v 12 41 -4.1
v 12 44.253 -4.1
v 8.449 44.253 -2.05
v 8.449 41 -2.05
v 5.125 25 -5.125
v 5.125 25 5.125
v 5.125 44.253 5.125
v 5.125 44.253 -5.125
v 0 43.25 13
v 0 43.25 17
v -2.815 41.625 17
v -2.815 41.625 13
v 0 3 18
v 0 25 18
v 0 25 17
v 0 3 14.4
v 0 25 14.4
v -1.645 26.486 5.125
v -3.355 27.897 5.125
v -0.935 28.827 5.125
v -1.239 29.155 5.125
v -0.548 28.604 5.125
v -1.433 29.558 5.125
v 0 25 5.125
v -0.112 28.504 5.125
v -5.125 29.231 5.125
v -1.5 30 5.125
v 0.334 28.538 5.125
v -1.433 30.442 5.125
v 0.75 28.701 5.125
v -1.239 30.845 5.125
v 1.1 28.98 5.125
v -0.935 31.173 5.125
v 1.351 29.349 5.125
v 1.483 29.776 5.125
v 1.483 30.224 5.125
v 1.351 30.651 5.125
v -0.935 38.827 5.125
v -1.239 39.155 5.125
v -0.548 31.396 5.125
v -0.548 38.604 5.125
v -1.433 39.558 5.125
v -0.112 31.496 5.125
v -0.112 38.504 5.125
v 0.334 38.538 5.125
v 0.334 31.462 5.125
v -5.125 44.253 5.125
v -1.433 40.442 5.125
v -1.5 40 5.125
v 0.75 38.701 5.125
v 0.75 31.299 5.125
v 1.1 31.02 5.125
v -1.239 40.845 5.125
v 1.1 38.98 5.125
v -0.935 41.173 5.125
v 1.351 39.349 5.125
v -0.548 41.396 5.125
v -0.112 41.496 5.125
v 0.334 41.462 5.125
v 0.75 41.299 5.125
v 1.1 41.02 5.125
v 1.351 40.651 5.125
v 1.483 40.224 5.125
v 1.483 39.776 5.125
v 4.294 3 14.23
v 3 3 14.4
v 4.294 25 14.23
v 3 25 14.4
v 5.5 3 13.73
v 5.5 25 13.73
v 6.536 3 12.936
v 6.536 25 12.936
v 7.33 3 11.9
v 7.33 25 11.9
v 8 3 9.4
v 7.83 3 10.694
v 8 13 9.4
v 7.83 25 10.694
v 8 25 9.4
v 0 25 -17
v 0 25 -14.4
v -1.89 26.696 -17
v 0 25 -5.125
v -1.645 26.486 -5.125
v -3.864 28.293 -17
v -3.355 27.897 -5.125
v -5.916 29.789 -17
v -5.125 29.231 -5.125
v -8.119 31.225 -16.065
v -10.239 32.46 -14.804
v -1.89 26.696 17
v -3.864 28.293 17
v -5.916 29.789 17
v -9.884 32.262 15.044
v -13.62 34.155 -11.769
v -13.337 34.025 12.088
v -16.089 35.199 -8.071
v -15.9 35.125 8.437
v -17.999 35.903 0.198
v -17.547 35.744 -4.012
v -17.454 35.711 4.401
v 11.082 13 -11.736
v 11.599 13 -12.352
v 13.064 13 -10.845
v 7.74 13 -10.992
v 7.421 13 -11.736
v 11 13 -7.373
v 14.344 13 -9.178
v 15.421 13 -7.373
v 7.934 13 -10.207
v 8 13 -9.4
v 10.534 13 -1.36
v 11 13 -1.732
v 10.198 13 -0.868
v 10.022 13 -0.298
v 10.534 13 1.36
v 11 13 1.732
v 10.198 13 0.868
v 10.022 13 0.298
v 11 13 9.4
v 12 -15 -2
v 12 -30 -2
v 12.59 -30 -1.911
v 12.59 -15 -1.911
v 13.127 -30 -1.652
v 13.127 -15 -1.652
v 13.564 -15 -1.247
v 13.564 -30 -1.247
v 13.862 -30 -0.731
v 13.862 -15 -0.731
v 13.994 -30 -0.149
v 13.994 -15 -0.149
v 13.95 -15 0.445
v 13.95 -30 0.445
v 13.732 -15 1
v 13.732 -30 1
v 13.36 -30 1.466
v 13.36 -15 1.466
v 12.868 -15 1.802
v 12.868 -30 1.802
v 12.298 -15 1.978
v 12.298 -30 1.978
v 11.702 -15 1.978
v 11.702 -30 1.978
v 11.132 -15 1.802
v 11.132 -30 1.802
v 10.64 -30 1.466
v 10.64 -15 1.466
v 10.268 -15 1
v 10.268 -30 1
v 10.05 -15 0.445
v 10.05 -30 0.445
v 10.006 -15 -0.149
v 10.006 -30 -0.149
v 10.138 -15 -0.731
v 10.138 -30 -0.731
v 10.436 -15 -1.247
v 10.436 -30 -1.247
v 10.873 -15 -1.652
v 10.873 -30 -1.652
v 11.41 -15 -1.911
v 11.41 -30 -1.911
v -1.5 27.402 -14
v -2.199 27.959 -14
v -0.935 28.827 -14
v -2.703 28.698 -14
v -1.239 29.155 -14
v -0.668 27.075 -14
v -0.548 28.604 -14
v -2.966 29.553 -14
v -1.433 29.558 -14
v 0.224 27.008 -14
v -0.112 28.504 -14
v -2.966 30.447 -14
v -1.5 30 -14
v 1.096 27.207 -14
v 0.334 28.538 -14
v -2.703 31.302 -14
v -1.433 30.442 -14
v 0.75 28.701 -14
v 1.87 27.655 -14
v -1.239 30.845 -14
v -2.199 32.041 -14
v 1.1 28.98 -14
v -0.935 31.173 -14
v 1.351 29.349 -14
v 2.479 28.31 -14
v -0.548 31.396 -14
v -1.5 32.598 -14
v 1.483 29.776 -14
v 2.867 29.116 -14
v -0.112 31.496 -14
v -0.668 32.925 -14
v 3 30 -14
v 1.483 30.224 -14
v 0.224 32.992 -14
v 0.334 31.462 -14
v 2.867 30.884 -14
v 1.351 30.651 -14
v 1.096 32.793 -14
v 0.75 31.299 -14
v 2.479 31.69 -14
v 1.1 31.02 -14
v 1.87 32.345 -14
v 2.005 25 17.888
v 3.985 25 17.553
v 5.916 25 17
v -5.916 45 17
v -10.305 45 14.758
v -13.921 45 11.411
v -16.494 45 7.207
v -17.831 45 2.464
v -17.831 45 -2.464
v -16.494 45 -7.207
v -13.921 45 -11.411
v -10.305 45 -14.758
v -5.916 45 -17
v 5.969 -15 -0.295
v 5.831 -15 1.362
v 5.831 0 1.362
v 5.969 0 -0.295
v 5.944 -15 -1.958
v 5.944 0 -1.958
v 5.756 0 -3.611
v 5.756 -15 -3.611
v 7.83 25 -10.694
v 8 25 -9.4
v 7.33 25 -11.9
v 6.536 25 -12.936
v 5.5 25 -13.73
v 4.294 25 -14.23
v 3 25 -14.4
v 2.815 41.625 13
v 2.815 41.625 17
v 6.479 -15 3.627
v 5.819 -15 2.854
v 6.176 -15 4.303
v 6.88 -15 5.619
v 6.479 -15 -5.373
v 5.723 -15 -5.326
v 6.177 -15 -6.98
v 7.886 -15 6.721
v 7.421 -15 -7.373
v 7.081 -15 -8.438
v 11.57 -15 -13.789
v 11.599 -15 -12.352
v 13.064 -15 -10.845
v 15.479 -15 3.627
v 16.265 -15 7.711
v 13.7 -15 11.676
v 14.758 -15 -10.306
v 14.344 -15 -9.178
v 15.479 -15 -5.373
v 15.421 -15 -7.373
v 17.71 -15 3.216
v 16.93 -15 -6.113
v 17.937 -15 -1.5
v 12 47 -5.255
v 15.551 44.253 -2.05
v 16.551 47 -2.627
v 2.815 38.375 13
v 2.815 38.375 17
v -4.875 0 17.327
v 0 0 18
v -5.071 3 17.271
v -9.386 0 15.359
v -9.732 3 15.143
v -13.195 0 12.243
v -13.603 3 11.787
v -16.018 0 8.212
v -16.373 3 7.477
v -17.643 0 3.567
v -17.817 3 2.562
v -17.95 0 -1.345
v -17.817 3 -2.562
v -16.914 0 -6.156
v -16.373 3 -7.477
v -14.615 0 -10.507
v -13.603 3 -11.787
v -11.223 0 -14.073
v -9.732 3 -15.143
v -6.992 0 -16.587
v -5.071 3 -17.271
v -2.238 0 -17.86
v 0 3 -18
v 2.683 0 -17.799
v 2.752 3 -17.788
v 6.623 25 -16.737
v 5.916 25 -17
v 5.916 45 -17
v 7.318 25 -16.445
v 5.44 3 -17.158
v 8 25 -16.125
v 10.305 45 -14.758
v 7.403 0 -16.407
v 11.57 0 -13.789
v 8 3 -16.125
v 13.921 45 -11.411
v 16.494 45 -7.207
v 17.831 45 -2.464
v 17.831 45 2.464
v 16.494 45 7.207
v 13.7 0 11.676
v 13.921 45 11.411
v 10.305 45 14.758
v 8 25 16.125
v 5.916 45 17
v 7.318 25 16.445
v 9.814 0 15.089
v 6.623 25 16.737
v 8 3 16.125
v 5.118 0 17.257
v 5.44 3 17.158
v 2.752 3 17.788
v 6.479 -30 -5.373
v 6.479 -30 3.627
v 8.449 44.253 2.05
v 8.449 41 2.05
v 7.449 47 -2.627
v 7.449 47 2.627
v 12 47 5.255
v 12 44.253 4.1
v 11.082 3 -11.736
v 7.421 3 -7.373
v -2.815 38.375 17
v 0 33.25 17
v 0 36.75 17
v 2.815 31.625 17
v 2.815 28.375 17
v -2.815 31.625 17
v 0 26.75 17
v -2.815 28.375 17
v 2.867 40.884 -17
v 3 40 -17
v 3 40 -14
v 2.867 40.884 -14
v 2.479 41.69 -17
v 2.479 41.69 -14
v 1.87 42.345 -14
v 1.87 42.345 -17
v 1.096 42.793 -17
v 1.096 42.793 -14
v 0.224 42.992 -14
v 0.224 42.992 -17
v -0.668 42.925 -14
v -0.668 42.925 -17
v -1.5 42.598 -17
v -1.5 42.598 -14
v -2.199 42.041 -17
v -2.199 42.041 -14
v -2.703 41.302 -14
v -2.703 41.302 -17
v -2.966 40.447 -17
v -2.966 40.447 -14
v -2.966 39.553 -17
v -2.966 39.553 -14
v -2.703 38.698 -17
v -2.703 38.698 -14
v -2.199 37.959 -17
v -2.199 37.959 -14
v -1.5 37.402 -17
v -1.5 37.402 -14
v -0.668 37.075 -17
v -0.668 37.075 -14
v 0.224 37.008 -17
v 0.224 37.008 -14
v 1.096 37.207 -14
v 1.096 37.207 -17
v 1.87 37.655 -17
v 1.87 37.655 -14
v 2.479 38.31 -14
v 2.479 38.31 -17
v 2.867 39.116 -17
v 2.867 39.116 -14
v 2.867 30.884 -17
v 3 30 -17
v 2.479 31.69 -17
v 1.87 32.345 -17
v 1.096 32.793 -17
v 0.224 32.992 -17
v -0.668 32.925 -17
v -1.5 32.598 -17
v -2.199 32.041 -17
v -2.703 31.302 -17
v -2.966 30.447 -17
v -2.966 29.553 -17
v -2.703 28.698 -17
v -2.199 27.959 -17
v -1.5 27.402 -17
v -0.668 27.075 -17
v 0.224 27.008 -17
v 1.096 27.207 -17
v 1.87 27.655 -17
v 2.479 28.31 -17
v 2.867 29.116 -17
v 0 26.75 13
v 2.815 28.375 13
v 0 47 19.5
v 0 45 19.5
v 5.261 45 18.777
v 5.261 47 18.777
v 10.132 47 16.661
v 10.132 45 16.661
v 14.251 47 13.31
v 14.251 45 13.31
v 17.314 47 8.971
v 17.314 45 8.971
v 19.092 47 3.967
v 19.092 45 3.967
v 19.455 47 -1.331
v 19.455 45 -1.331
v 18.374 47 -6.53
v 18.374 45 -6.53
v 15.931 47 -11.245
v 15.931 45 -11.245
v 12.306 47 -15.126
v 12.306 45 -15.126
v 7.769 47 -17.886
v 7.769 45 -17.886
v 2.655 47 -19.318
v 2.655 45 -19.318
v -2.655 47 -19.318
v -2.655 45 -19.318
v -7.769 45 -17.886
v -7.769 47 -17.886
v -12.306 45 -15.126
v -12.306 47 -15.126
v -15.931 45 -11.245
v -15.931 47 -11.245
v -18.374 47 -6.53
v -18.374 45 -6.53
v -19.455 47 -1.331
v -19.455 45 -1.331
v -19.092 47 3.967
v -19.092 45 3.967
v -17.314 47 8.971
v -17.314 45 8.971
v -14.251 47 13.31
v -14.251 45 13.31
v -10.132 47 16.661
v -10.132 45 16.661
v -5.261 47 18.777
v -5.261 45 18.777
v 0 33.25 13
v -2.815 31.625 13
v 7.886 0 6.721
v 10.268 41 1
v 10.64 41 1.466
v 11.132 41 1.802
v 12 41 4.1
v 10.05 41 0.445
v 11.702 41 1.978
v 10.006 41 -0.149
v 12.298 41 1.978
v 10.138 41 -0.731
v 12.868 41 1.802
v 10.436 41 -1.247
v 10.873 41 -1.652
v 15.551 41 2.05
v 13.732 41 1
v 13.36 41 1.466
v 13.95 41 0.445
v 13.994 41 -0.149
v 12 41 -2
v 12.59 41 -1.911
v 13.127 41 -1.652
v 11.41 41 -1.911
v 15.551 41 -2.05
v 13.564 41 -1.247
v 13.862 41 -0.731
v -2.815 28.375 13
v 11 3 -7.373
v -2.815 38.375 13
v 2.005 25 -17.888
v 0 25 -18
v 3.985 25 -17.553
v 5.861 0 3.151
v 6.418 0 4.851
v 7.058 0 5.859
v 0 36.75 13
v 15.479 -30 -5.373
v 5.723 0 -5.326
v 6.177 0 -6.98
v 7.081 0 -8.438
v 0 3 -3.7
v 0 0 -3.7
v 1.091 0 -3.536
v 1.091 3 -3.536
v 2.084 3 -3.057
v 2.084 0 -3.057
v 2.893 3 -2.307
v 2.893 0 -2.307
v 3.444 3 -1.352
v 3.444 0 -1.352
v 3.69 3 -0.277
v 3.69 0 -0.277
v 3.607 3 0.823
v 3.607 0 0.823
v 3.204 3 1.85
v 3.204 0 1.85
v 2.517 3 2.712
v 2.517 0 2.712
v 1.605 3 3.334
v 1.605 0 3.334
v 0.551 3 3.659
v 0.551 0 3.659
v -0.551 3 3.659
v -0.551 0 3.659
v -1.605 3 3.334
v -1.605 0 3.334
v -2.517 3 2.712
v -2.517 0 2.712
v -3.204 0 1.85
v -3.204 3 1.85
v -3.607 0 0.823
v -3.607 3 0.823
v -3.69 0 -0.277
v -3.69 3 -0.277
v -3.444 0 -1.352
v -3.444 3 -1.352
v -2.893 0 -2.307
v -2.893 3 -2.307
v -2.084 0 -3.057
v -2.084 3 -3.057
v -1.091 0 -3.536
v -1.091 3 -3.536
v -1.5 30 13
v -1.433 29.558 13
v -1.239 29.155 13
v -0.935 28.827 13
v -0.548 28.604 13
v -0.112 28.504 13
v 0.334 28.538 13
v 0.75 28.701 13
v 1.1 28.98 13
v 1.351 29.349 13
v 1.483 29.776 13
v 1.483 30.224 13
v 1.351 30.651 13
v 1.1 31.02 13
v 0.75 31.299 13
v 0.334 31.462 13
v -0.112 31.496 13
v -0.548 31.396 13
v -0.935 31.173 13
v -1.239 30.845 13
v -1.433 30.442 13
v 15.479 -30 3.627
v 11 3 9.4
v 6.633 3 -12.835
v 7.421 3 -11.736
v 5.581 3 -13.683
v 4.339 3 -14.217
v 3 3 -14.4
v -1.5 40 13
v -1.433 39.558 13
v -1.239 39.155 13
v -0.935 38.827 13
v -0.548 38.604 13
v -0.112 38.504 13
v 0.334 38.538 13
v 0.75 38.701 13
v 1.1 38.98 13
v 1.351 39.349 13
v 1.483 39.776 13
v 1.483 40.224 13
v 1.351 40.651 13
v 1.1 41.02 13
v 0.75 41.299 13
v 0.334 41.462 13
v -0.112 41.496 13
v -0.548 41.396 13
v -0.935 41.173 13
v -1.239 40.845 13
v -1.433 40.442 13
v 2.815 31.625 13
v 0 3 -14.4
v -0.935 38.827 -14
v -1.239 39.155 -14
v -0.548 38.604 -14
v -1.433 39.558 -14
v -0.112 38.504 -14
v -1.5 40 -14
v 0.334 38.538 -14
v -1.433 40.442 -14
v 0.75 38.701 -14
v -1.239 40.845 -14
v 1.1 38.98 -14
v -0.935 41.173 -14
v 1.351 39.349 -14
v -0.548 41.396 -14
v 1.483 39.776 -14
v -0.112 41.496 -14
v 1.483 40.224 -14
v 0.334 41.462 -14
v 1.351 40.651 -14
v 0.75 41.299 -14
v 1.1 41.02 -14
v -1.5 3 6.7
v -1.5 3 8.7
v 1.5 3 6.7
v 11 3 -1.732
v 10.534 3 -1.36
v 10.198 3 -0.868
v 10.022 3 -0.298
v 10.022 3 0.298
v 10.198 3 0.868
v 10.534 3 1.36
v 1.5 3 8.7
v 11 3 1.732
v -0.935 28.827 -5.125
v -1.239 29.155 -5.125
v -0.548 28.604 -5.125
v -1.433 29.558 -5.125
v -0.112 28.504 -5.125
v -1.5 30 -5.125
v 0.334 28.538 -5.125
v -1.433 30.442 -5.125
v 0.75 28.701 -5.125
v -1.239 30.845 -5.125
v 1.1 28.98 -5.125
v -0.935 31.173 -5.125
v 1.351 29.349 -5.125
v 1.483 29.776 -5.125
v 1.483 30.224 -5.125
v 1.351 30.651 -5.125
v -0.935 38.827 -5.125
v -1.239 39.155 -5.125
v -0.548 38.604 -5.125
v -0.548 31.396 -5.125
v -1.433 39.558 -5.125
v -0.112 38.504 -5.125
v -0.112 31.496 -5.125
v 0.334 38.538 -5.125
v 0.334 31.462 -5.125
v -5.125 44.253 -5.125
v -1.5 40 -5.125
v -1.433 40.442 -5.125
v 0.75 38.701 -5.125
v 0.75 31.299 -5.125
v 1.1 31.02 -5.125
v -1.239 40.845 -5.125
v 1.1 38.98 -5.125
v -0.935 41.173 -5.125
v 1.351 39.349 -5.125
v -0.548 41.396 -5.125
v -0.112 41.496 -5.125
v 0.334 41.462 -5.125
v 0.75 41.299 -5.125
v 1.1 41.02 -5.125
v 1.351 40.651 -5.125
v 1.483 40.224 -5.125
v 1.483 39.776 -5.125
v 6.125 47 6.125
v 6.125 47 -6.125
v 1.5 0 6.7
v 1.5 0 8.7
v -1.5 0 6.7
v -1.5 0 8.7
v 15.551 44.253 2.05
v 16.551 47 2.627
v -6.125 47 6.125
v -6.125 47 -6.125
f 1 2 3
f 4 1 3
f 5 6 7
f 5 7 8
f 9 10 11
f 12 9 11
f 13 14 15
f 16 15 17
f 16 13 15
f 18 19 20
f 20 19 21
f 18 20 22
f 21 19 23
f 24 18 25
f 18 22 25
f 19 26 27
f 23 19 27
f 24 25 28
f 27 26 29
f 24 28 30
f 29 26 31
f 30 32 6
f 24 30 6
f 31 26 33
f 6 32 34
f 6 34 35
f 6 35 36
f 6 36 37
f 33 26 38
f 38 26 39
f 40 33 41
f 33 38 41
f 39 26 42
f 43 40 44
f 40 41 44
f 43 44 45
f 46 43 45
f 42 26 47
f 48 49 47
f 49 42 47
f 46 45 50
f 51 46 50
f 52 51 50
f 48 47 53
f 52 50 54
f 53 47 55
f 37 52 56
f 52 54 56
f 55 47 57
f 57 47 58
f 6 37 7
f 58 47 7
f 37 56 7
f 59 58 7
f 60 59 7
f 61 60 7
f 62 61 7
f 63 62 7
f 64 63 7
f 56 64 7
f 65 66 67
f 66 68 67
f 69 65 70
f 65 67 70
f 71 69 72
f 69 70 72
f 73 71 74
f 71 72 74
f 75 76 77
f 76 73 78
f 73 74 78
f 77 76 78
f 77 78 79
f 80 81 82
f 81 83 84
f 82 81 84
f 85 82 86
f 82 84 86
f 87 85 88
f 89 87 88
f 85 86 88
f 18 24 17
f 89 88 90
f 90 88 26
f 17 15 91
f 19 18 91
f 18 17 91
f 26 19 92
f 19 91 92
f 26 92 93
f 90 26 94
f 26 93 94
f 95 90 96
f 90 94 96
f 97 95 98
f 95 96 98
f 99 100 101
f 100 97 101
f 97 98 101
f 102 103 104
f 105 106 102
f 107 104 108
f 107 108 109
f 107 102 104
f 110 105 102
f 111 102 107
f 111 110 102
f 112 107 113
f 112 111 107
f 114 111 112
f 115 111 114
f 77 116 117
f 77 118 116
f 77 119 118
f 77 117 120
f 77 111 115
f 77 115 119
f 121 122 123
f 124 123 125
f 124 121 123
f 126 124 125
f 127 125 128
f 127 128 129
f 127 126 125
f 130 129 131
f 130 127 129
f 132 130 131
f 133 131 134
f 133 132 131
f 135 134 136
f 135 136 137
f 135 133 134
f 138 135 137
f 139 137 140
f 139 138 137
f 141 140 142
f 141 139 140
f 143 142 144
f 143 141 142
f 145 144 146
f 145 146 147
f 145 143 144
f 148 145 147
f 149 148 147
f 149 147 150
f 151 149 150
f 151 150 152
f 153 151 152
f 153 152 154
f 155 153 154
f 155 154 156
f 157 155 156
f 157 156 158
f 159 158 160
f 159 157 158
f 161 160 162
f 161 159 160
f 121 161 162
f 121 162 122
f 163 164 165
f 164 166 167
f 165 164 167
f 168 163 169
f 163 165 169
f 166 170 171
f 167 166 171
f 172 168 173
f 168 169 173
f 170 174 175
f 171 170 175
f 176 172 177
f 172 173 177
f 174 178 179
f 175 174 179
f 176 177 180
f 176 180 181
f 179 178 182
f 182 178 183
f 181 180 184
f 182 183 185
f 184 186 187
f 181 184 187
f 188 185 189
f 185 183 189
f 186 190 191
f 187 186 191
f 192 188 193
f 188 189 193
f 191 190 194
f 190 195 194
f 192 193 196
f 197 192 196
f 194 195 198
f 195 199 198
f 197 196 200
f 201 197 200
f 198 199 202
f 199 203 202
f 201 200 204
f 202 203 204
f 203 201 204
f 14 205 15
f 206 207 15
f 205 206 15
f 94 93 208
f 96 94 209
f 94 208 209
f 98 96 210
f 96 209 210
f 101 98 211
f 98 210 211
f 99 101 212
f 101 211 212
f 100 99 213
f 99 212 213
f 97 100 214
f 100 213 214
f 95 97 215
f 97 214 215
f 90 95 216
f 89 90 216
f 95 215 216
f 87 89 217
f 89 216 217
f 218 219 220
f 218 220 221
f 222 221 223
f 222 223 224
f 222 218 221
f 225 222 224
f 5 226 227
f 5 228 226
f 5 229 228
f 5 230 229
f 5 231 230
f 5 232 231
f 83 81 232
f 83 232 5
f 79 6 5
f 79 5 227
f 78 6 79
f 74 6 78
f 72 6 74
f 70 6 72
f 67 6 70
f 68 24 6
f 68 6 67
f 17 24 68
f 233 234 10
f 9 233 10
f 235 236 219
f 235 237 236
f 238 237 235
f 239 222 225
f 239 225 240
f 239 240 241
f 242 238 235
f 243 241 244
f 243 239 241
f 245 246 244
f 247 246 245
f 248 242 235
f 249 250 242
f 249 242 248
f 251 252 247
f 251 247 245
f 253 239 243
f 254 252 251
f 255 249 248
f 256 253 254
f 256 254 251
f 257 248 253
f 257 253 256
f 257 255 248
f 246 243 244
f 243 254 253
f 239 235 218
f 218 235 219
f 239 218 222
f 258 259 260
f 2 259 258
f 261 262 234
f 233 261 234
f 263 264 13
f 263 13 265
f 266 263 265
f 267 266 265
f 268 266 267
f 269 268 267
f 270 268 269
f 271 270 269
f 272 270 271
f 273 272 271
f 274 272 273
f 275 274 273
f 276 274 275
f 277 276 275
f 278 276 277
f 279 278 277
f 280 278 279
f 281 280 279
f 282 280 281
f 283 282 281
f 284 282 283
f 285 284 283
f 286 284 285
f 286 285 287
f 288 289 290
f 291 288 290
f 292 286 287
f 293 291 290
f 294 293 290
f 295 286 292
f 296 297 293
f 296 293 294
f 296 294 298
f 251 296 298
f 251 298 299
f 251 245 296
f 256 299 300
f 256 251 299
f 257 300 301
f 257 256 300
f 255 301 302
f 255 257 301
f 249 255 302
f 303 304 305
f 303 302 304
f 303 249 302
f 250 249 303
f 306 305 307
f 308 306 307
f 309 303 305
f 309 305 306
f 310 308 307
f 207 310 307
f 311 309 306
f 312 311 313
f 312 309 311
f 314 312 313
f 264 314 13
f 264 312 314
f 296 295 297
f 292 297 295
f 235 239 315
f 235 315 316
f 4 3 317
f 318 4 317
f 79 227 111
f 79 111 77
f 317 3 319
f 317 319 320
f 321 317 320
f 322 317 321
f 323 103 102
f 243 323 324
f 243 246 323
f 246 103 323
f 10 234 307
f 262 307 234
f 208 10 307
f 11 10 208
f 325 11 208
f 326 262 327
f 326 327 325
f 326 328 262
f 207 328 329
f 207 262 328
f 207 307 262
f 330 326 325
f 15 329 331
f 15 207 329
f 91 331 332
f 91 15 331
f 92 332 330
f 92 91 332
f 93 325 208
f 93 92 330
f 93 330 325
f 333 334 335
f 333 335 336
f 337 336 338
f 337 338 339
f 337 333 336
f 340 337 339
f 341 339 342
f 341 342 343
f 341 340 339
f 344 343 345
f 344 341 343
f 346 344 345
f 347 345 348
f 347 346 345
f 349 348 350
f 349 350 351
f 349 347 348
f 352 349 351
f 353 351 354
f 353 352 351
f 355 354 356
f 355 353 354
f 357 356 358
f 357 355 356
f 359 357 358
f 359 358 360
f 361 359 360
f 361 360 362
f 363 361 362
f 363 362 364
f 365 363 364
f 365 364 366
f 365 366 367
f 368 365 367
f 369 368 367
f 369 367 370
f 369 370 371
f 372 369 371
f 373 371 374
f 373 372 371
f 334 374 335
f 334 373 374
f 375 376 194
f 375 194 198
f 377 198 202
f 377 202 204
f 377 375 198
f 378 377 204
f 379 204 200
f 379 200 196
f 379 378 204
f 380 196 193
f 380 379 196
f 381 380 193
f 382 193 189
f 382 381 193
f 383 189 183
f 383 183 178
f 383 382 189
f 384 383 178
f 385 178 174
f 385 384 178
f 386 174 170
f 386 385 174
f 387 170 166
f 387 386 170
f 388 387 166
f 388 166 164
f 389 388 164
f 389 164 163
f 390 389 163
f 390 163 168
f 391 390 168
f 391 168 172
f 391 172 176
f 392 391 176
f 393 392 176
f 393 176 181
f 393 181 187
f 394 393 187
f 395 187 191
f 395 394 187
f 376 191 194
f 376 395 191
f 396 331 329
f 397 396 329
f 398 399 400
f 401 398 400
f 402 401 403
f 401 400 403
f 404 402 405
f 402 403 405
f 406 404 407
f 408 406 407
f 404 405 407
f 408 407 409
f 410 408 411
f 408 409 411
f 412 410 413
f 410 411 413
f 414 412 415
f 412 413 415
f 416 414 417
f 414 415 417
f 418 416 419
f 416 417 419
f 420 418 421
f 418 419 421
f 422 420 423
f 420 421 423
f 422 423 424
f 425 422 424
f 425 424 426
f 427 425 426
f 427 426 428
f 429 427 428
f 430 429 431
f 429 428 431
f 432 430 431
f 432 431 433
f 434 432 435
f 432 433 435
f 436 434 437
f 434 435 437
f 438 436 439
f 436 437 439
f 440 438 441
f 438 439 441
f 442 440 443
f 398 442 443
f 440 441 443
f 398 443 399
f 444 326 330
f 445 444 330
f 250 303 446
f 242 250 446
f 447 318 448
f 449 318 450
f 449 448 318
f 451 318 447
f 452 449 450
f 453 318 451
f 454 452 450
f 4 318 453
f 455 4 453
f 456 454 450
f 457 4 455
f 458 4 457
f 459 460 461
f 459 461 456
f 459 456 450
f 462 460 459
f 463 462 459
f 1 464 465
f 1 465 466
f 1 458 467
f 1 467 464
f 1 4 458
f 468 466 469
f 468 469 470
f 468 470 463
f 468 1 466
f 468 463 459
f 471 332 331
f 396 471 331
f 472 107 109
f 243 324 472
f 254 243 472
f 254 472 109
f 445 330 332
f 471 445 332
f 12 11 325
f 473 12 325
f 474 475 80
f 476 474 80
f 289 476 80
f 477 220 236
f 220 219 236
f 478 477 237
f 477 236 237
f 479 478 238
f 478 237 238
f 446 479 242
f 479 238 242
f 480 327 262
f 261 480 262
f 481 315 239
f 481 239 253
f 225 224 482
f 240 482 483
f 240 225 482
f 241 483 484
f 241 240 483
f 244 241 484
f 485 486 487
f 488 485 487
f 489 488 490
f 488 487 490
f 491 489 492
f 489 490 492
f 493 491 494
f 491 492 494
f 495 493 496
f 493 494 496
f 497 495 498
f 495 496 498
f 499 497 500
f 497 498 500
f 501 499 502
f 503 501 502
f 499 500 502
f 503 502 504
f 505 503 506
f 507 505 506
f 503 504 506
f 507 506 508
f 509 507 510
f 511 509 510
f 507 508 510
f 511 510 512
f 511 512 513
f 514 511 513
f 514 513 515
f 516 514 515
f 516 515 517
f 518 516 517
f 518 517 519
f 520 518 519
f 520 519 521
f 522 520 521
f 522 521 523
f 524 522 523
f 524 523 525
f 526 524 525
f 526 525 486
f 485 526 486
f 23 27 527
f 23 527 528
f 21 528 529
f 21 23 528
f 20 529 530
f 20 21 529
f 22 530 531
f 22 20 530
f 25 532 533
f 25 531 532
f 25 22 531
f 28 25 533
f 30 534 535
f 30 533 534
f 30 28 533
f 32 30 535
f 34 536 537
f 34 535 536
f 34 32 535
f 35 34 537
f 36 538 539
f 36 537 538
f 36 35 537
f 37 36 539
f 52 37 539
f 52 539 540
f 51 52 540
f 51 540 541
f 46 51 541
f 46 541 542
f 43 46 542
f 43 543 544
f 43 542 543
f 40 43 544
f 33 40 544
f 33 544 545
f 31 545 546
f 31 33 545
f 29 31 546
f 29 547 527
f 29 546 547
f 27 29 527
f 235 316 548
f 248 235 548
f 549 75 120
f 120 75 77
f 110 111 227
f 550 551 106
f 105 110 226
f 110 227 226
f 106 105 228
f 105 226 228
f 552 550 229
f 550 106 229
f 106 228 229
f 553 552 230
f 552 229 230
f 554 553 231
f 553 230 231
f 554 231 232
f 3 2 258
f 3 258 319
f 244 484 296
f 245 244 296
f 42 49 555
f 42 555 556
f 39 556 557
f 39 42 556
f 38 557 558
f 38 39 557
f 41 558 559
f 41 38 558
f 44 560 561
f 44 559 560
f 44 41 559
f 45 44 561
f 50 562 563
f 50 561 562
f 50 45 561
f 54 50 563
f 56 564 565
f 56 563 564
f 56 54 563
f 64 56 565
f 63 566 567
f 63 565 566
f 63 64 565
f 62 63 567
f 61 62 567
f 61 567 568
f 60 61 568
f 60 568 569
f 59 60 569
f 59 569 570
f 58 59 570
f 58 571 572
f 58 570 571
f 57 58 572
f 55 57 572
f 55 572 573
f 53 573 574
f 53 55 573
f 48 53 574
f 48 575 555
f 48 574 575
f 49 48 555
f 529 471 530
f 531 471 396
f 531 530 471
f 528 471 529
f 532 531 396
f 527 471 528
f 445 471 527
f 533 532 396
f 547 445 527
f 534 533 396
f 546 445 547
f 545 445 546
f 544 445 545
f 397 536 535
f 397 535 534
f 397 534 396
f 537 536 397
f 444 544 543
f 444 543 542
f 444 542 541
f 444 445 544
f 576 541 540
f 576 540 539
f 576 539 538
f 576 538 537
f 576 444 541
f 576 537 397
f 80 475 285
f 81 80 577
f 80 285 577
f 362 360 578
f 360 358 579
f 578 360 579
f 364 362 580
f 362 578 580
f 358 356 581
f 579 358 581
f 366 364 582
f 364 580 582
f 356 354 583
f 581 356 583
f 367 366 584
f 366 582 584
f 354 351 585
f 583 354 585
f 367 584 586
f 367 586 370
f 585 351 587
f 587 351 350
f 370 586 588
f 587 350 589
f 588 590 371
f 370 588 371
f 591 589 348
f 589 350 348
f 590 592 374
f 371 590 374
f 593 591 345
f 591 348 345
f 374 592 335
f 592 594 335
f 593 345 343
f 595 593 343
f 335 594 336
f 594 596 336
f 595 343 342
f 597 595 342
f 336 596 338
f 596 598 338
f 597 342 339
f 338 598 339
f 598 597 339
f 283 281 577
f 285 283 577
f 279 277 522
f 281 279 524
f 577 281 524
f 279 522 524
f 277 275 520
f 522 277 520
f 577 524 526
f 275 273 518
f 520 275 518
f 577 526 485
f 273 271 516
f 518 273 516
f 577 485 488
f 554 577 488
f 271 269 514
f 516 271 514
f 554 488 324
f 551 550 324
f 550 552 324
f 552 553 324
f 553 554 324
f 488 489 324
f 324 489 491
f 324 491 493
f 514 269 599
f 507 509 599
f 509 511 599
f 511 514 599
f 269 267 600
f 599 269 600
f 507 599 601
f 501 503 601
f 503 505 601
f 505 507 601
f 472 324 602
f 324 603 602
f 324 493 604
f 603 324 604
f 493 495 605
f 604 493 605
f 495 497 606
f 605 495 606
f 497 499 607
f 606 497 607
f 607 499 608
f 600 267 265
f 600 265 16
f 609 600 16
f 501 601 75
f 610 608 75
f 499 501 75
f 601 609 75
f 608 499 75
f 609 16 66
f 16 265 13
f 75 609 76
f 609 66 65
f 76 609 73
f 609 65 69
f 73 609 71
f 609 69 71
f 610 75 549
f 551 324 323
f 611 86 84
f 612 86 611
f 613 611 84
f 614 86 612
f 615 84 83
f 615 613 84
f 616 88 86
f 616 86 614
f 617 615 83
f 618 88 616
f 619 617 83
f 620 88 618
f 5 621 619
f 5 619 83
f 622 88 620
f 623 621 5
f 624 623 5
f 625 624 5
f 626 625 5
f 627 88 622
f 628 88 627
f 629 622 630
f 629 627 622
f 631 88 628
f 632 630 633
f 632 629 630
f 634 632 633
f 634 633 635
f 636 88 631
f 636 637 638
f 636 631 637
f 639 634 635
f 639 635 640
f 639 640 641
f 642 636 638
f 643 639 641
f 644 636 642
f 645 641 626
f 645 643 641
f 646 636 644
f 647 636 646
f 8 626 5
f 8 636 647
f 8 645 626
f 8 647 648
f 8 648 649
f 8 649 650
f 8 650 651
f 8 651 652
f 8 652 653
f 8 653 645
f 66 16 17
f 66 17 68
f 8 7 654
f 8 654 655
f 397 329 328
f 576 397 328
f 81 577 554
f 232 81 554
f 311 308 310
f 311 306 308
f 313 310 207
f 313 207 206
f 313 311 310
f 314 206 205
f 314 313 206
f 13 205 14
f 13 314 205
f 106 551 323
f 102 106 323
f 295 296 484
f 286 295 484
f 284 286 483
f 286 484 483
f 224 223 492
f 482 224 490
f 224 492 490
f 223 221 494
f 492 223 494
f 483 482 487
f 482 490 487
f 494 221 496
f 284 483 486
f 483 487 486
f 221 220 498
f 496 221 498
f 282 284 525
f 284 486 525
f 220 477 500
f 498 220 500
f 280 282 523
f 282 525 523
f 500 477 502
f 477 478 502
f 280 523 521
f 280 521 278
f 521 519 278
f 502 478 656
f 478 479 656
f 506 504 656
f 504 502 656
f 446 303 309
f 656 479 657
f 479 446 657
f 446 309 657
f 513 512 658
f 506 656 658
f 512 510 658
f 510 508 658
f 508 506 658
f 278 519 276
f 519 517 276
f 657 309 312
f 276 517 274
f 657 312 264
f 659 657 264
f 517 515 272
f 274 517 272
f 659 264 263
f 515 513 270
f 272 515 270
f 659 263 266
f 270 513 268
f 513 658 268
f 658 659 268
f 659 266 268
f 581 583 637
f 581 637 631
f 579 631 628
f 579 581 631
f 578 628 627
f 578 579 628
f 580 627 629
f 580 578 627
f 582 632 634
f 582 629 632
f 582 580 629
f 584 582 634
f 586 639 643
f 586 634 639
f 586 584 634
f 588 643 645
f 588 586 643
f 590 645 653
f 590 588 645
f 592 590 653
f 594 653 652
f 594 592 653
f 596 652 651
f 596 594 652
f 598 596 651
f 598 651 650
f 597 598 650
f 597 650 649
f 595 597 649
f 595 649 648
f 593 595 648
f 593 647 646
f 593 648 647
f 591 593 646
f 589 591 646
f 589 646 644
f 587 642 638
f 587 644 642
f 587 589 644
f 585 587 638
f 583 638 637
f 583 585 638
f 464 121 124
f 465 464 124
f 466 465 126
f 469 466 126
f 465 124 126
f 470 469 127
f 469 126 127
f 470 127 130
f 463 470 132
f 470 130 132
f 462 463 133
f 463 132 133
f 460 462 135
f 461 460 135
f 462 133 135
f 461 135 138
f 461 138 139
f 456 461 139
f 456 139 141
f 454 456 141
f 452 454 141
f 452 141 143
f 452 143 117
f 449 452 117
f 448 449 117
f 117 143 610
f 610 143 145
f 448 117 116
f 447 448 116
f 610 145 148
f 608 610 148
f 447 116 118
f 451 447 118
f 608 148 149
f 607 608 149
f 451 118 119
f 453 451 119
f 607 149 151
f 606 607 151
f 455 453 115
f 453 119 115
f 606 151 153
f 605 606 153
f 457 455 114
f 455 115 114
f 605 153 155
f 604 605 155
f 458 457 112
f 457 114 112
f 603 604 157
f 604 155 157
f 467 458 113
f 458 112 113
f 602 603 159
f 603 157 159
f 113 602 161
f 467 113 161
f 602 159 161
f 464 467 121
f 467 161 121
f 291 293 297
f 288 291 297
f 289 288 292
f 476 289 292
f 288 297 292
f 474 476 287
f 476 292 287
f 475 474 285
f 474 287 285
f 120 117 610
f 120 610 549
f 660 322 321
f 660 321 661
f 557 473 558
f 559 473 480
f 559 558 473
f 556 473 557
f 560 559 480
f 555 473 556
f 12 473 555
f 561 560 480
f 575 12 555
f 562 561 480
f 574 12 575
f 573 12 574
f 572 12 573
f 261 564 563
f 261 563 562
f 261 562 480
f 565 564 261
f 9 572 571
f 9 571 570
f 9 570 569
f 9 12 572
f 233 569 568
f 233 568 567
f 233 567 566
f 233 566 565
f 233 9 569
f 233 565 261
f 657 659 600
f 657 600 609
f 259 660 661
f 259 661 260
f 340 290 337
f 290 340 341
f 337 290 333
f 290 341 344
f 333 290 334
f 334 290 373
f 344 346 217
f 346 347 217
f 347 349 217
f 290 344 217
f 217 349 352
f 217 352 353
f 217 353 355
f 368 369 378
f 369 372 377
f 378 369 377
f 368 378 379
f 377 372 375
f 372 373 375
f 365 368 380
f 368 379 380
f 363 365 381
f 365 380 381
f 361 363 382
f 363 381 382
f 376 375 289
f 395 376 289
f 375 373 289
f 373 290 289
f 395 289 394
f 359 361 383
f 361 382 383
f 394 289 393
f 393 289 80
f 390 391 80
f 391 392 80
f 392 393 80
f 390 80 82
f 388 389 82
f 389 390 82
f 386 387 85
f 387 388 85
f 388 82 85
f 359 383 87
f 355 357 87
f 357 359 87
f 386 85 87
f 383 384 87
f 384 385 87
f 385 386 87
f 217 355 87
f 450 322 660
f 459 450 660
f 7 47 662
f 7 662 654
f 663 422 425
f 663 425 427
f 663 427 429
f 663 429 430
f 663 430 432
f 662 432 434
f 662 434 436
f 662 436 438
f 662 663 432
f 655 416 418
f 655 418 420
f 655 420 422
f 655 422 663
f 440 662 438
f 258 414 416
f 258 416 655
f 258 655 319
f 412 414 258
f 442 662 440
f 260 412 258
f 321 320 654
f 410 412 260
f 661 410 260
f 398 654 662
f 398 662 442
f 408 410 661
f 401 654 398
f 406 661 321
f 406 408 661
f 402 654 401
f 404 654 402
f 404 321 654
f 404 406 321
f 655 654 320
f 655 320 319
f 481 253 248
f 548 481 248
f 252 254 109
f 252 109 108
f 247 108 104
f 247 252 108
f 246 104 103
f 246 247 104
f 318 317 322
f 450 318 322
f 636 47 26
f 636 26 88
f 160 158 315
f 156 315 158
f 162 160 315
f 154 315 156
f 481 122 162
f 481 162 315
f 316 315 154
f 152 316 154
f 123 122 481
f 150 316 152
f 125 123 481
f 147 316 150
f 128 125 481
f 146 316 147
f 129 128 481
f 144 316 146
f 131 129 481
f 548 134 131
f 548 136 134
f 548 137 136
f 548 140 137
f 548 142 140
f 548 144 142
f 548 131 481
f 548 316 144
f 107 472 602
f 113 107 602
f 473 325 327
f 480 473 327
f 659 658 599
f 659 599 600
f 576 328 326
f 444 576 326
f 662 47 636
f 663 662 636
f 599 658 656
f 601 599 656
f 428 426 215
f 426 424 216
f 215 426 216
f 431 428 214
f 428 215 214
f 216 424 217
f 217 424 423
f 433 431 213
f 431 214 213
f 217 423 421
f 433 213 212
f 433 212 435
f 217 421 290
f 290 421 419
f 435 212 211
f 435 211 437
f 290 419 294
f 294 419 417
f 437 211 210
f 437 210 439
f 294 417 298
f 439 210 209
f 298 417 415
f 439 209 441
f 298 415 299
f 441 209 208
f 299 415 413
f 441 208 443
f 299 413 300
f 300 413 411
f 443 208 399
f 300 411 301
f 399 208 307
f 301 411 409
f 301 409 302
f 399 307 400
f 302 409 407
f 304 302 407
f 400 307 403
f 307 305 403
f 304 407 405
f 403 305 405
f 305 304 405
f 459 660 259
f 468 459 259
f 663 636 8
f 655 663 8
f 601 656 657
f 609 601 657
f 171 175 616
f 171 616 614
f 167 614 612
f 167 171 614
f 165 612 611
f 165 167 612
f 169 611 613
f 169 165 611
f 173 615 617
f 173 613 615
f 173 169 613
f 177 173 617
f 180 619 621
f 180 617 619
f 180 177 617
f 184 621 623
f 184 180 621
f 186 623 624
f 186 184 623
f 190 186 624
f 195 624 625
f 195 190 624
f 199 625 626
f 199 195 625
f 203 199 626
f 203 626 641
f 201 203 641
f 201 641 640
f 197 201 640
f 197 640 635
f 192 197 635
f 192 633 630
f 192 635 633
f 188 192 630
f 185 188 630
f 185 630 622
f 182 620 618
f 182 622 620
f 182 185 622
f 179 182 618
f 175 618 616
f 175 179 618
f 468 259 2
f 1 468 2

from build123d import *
from build123d.topology import SkipClean

# Parameters (mm, degrees)
SKETCH_1_R          = 18
EXTRUDE_1_DEPTH     = 45
SKETCH_2_R          = 19.5
EXTRUDE_2_DEPTH     = 2
SKETCH_3_W          = 10.25
SKETCH_3_H          = 10.25
CUT_EXTRUDE_1_DEPTH = 40
EXTRUDE_3_DEPTH     = 15
SKETCH1_R           = 18
BOSS_EXTRUDE1_DEPTH = 20
SKETCH3_R           = 18
BOSS_EXTRUDE2_DEPTH = 7
SKETCH4_W           = 10.2
SKETCH4_H           = 10.2
CUT_EXTRUDE2_DEPTH  = 27
CUT_EXTRUDE4_DEPTH  = 25
BOSS_EXTRUDE3_DEPTH = 3
SKETCH9_W           = 36
SKETCH9_H           = 22
CUT_EXTRUDE5_DEPTH  = 8
SKETCH10_R          = 3.7
SKETCH10_W          = 3
SKETCH10_H          = 2
CUT_EXTRUDE6_DEPTH  = 10
SKETCH11_R          = 2
CUT_EXTRUDE7_DEPTH  = 102
SKETCH15_R          = 18
CUT_EXTRUDE9_DEPTH  = 27
CUT_EXTRUDE11_DEPTH = 20
SKETCH18_R          = 1.5
CUT_EXTRUDE12_DEPTH = 63.62188116
SKETCH19_R          = 3
CUT_EXTRUDE13_DEPTH = 3
BOSS_EXTRUDE5_DEPTH = 22
CUT_EXTRUDE16_DEPTH = 4
CUT_EXTRUDE17_DEPTH = 6
CUT_EXTRUDE18_DEPTH = 63.62188116
FILLET2_R           = 5
SKETCH30_W          = 18.8
SKETCH30_H          = 10
CUT_EXTRUDE20_DEPTH = 3
CHAMFER1_SIZE       = 1
CHAMFER1_SIZE2      = 2.747477419
CHAMFER2_SIZE       = 1
CHAMFER2_SIZE2      = 2.747477419
SKETCH37_W          = 9
SKETCH37_H          = 9
SKETCH37_R          = 2
BOSS_EXTRUDE7_DEPTH = 15
CUT_EXTRUDE22_DEPTH = 15
CUT_EXTRUDE23_REACH = 69.856
SKETCH40_W          = 4.363156696
SKETCH40_H          = 4.363156696
CUT_EXTRUDE24_DEPTH = 10
FILLET7_R           = 6


with BuildPart() as part:
    # Эскиз1 → Бобышка-Вытянуть1 (new body)
    with BuildSketch(Plane(origin=(0, 0, 0), x_dir=(1, 0, 0), z_dir=(0, 1, 0))):
        with Locations(Location((0, 0, 0), (0, 0, 90))):
            Circle(SKETCH_1_R)
    extrude(amount=EXTRUDE_1_DEPTH)

    # Эскиз2 → Бобышка-Вытянуть2 (add)
    with BuildSketch(Plane(origin=(0, 45, 0), x_dir=(1, 0, 0), z_dir=(0, 1, 0))):
        with Locations(Location((0, 0, 0), (0, 0, 270))):
            Circle(SKETCH_2_R)
    extrude(amount=EXTRUDE_2_DEPTH)

    # Эскиз3 → Вырез-Вытянуть1 (cut)
    with BuildSketch(Plane(origin=(0, 47, 0), x_dir=(1, 0, 0), z_dir=(0, 1, 0))):
        Rectangle(SKETCH_3_W, SKETCH_3_H)
    extrude(amount=-CUT_EXTRUDE_1_DEPTH, mode=Mode.SUBTRACT)

    # Эскиз4 → Бобышка-Вытянуть3 (add)
    with BuildSketch(Plane.XZ):
        with BuildLine():
            Line((5.142300877, -6.128355545), (11.570176974, -13.788799976))
            ThreePointArc((11.570176974, -13.788799976), (17.937391115, -1.5), (13.69961987, 11.675633406))
            Line((13.69961987, 11.675633406), (5.142300877, 4.38257561))
            Line((5.142300877, 4.38257561), (5.142300877, -6.128355545))
        make_face()
    extrude(amount=EXTRUDE_3_DEPTH)

    # Sketch1 → Boss-Extrude1 (add)
    with BuildSketch(Plane.XZ.offset(15)):
        with Locations(Location((0, 0, 0), (0, 0, 270))):
            Circle(SKETCH1_R)
    extrude(amount=BOSS_EXTRUDE1_DEPTH)

    # Sketch3 → Boss-Extrude2 (add)
    with BuildSketch(Plane.XZ.offset(35)):
        with Locations(Location((0, 0, 0), (0, 0, 270))):
            Circle(SKETCH3_R)
    extrude(amount=BOSS_EXTRUDE2_DEPTH)

    # Sketch4 → Cut-Extrude2 (cut)
    with BuildSketch(Plane.XZ.offset(42)):
        Rectangle(SKETCH4_W, SKETCH4_H)
    extrude(amount=-CUT_EXTRUDE2_DEPTH, mode=Mode.SUBTRACT)

    # Sketch6 → Cut-Extrude4 (cut)
    with BuildSketch(Plane.XZ):
        with BuildLine():
            Line((0, 18), (0, -18))
            ThreePointArc((0, -18), (-18, 0), (0, 18))
        make_face()
    extrude(amount=-CUT_EXTRUDE4_DEPTH, mode=Mode.SUBTRACT)

    # Sketch8 → Boss-Extrude3 (add)
    with BuildSketch(Plane.XZ):
        with BuildLine():
            Line((0, -18), (0, 18))
            ThreePointArc((0, 18), (-18, 0), (0, -18))
        make_face()
    extrude(amount=-BOSS_EXTRUDE3_DEPTH)

    # Sketch9 → Cut-Extrude5 (cut)
    with BuildSketch(Plane.ZY):
        with Locations((0, 14)):
            Rectangle(SKETCH9_W, SKETCH9_H)
    extrude(amount=-CUT_EXTRUDE5_DEPTH, mode=Mode.SUBTRACT)

    # Sketch10 → Cut-Extrude6 (cut)
    with BuildSketch(Plane.XZ):
        with Locations(Location((0, 0, 0), (0, 0, 270))):
            Circle(SKETCH10_R)
        with Locations((0, 7.7)):
            Rectangle(SKETCH10_W, SKETCH10_H)
    extrude(amount=-CUT_EXTRUDE6_DEPTH, mode=Mode.SUBTRACT)

    # Sketch11 → Cut-Extrude7 (cut)
    with BuildSketch(Plane.XZ.offset(42)):
        with Locations(Location((12, 0, 0), (0, 0, 270))):
            Circle(SKETCH11_R)
    extrude(amount=-CUT_EXTRUDE7_DEPTH, mode=Mode.SUBTRACT)

    # Sketch15 → Cut-Extrude9 (cut)
    with BuildSketch(Plane.XZ.offset(42)):
        with Locations(Location((0, 0, 0), (0, 0, 310))):
            Circle(SKETCH15_R)
    extrude(amount=-CUT_EXTRUDE9_DEPTH, mode=Mode.SUBTRACT)

    # Sketch17 → Cut-Extrude11 (cut)
    with BuildSketch(Plane.XZ.offset(-25)):
        with BuildLine():
            Line((5.916079783, -17), (-5.916079783, -17))
            ThreePointArc((-5.916079783, -17), (0, -18), (5.916079783, -17))
        make_face()
        with BuildLine():
            Line((5.916079783, 17), (-5.916079783, 17))
            ThreePointArc((-5.916079783, 17), (0, 18), (5.916079783, 17))
        make_face()
    extrude(amount=-CUT_EXTRUDE11_DEPTH, mode=Mode.SUBTRACT)

    # Sketch18 → Cut-Extrude12 (cut, through all)
    with BuildSketch(Plane.XY.offset(-17)):
        with Locations(Location((0, 30, 0), (0, 0, 180))):
            Circle(SKETCH18_R)
        with Locations(Location((0, 40, 0), (0, 0, 180))):
            Circle(SKETCH18_R)
    extrude(amount=CUT_EXTRUDE12_DEPTH, mode=Mode.SUBTRACT)

    # Sketch19 → Cut-Extrude13 (cut)
    with BuildSketch(Plane.XY.offset(-17)):
        with Locations((0, 30)):
            Circle(SKETCH19_R)
        with Locations((0, 40)):
            Circle(SKETCH19_R)
    extrude(amount=CUT_EXTRUDE13_DEPTH, mode=Mode.SUBTRACT)

    # Sketch23 → Boss-Extrude5 (add)
    with SkipClean():  # the faces are left unmerged after this step: merging them gives an invalid solid
        with BuildSketch(Plane(origin=(0, 3, 0), x_dir=(1, 0, 0), z_dir=(0, 1, 0))):
            with BuildLine():
                Line((0, -14.4), (8, -14.4))
                Line((8, -14.4), (8, -16.124515497))
                ThreePointArc((8, -16.124515497), (4.108449894, -17.524857759), (0, -18))
                Line((0, -18), (0, -14.4))
            make_face()
            with BuildLine():
                Line((0, 14.4), (8, 14.4))
                Line((8, 14.4), (8, 16.124515497))
                ThreePointArc((8, 16.124515497), (4.108449894, 17.524857759), (0, 18))
                Line((0, 18), (0, 14.4))
            make_face()
        extrude(amount=BOSS_EXTRUDE5_DEPTH)

    # Sketch25 → Cut-Extrude16 (cut)
    with SkipClean():  # the faces are left unmerged after this step: merging them gives an invalid solid
        with BuildSketch(Plane.XY.offset(17)):
            Polygon((-2.814582562, 28.375), (0, 26.75), (2.814582562, 28.375), (2.814582562, 31.625), (0, 33.25), (-2.814582562, 31.625), align=None)
            Polygon((-2.814582562, 41.625), (-2.814582562, 38.375), (0, 36.75), (2.814582562, 38.375), (2.814582562, 41.625), (0, 43.25), align=None)
        extrude(amount=-CUT_EXTRUDE16_DEPTH, mode=Mode.SUBTRACT)

    # Sketch26 → Cut-Extrude17 (cut)
    with SkipClean():  # the faces are left unmerged after this step: merging them gives an invalid solid
        with BuildSketch(Plane(origin=(0, 47, 0), x_dir=(1, 0, 0), z_dir=(0, 1, 0))):
            Polygon((8.449295844, -2.05), (12, -4.1), (15.550704156, -2.05), (15.550704156, 2.05), (12, 4.1), (8.449295844, 2.05), align=None)
        extrude(amount=-CUT_EXTRUDE17_DEPTH, mode=Mode.SUBTRACT)

    # Sketch27 → Cut-Extrude18 (cut, through all)
    with SkipClean():  # the faces are left unmerged after this step: merging them gives an invalid solid
        with BuildSketch(Plane.XY.offset(17)):
            with BuildLine():
                Line((-20, 36.547005384), (-20, 25))
                Line((-20, 25), (0, 25))
                ThreePointArc((0, 25), (-9.324199199, 31.944024015), (-20, 36.547005384))
            make_face()
        extrude(amount=-CUT_EXTRUDE18_DEPTH, mode=Mode.SUBTRACT)

    # Fillet2
    fillet2_edges = [part.edges().sort_by_distance(p)[0] for p in [
        (8, 14, -14.4),
        (8, 14, 14.4),
    ]]
    fillet(fillet2_edges, radius=FILLET2_R)

    # Sketch30 → Cut-Extrude20 (cut)
    with SkipClean():  # the faces are left unmerged after this step: merging them gives an invalid solid
        with BuildSketch(Plane.ZY.offset(-8)):
            with Locations((0, 8)):
                Rectangle(SKETCH30_W, SKETCH30_H)
        extrude(amount=-CUT_EXTRUDE20_DEPTH, mode=Mode.SUBTRACT)

    # Chamfer1
    chamfer1_edges = [part.edges().sort_by_distance(p)[0] for p in [
        (5.125, 47, 0),
        (0, 47, -5.125),
        (-5.125, 47, 0),
        (0, 47, 5.125),
    ]]
    chamfer1_side = [part.faces().sort_by_distance(p)[0] for p in [
        (0, 47, -18.948456711),
    ]]
    chamfer(chamfer1_edges, length=CHAMFER1_SIZE, length2=CHAMFER1_SIZE2, reference=chamfer1_side[0])

    # Chamfer2
    chamfer2_edges = [part.edges().sort_by_distance(p)[0] for p in [
        (8.449295844, 47, 0),
        (10.224647922, 47, 3.075),
        (13.775352078, 47, 3.075),
        (15.550704156, 47, 0),
        (13.775352078, 47, -3.075),
        (10.224647922, 47, -3.075),
    ]]
    chamfer2_side = [part.faces().sort_by_distance(p)[0] for p in [
        (6.676543289, 47, 0),
    ]]
    chamfer(chamfer2_edges, length=CHAMFER2_SIZE, length2=CHAMFER2_SIZE2, reference=chamfer2_side[0])

    # Sketch37 → Boss-Extrude7 (add)
    with SkipClean():  # the faces are left unmerged after this step: merging them gives an invalid solid
        with BuildSketch(Plane.XZ.offset(15)):
            with Locations((10.978822628, -0.872889968)):
                Rectangle(SKETCH37_W, SKETCH37_H)
            with Locations(Location((12, 0, 0), (0, 0, 270))):
                Circle(SKETCH37_R, mode=Mode.SUBTRACT)
        extrude(amount=BOSS_EXTRUDE7_DEPTH)

    # Sketch38 → Cut-Extrude22 (cut)
    with SkipClean():  # the faces are left unmerged after this step: merging them gives an invalid solid
        with BuildSketch(Plane.XZ.offset(15)):
            with BuildLine():
                Line((5.142300877, -6.128355545), (5.142300877, 4.38257561))
                ThreePointArc((5.142300877, 4.38257561), (5.978822628, -0.872889968), (5.142300877, -6.128355545))
            make_face()
        extrude(amount=-CUT_EXTRUDE22_DEPTH, mode=Mode.SUBTRACT)

    # Cut-Extrude23: up to this face of the body (flat: up to its plane)
    cut_extrude23_end = Plane(part.part.faces().sort_by_distance((9.450359937, 13, 0))[0])
    # Sketch39 → Cut-Extrude23 (cut, up to the picked face)
    with BuildSketch(Plane.XZ.offset(15), mode=Mode.PRIVATE) as cut_extrude23_sk1:
        with BuildLine():
            Line((7.420733648, -7.372889968), (15.420733648, -7.372889968))
            ThreePointArc((15.420733648, -7.372889968), (13.728515389, -10.030415688), (11.598853111, -12.352178848))
            Line((11.598853111, -12.352178848), (7.420733648, -7.372889968))
        make_face()
    cut_extrude23_tool1 = split(extrude(cut_extrude23_sk1.sketch, amount=-CUT_EXTRUDE23_REACH, mode=Mode.PRIVATE), bisect_by=cut_extrude23_end, keep=Keep.BOTH, mode=Mode.PRIVATE)
    add(cut_extrude23_tool1.solids().sort_by(Axis((11.596211, -15, -9.081847), (0, 1, 0)))[0], mode=Mode.SUBTRACT)

    # Sketch40 → Cut-Extrude24 (cut)
    with SkipClean():  # the faces are left unmerged after this step: merging them gives an invalid solid
        with BuildSketch(Plane(origin=(0, 3, 0), x_dir=(1, 0, 0), z_dir=(0, 1, 0))):
            with Locations((9.602311996, 9.554468316)):
                Rectangle(SKETCH40_W, SKETCH40_H)
        extrude(amount=CUT_EXTRUDE24_DEPTH, mode=Mode.SUBTRACT)

    # Fillet7
    fillet7_edges = [part.edges().sort_by_distance(p)[0] for p in [
        (5.142300877, -7.5, 4.38257561),
        (5.142300877, -7.5, -6.128355545),
    ]]
    fillet(fillet7_edges, radius=FILLET7_R)


solid = part.part
